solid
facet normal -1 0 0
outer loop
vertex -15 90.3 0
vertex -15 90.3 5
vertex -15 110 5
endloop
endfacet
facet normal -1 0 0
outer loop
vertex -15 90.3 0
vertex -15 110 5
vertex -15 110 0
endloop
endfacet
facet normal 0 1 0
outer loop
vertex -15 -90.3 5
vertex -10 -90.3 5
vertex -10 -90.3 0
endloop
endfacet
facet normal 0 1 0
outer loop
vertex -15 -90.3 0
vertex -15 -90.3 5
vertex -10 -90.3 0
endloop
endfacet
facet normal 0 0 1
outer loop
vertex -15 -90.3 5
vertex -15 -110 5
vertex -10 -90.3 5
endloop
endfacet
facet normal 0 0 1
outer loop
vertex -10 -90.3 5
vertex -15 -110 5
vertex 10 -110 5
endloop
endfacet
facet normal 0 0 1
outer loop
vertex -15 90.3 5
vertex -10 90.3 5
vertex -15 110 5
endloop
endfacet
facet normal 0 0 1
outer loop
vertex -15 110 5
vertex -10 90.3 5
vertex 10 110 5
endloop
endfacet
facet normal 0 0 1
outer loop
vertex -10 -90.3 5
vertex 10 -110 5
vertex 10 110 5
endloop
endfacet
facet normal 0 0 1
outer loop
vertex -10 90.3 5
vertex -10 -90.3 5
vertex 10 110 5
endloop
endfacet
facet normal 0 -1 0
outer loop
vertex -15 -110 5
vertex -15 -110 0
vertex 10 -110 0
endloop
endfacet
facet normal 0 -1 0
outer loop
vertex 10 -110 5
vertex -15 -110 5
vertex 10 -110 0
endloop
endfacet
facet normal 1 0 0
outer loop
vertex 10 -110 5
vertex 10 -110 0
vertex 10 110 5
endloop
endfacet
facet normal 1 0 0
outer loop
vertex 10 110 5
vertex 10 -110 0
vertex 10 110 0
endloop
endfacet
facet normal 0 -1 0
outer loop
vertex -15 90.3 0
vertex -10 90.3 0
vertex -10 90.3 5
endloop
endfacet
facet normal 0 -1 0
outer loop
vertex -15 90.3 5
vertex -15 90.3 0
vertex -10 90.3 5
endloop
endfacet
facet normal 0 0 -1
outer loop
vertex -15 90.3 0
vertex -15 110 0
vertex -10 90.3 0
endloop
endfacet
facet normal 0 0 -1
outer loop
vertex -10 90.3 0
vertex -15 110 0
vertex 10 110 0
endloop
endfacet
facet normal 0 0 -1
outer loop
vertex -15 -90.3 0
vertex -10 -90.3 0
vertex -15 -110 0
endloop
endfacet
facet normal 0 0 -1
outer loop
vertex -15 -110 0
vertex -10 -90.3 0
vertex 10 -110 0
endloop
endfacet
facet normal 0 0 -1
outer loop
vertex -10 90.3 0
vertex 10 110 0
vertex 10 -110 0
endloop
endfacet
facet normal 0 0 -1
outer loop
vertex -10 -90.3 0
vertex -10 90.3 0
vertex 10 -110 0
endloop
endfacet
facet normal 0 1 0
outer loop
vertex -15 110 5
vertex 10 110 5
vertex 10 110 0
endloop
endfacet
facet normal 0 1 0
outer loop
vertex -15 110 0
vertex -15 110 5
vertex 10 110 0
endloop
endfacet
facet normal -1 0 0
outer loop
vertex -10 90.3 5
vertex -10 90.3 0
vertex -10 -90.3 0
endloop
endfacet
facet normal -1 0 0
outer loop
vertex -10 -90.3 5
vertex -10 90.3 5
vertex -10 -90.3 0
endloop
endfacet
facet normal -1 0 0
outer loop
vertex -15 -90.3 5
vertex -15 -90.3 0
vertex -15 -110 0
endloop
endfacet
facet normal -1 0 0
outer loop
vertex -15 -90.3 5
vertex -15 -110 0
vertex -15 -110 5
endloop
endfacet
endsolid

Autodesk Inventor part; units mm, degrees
ref_plane "YZ Plane" through (0, 0, 0) normal (1, 0, 0) x (0, 1, 0)
ref_plane "XZ Plane" through (0, 0, 0) normal (0, 1, 0) x (-1, 0, 0)
ref_plane "XY Plane" through (0, 0, 0) normal (0, 0, 1) x (1, 0, 0)
sketch "Sketch1" plane through (0, 0, 0) normal (0, 0, 1) x (1, 0, 0)
  line L0 (-10, -110) -> (10, -110)
  line L1 (10, -110) -> (10, 110)
  line L2 (10, 110) -> (-10, 110)
  line L3 (-10, 110) -> (-10, -110)
  point P0 (0, 0)
  dimension "width" = 20
  dimension "d1" = 10
  dimension "d2" = 220
  dimension "d3" = 110
extrude "Extrusion1" add sketch "Sketch1" along normal blind 5
sketch "Sketch4" plane through (-10, -110, 0) normal (-1, 0, 0) x (0, 0, 1)
  line L0 (5, 0) -> (5, 220) projected
  line L1 (0, 0) -> (5, 0)
  line L2 (5, 0) -> (5, 19.7)
  line L3 (5, 19.7) -> (0, 19.7)
  line L4 (0, 19.7) -> (0, 0)
  point P0 (0, 110)
  dimension "d29" = 19.7
extrude "Extrusion4" add sketch "Sketch4" along normal blind 5
mirror "Mirror1" about plane through (0, 0, 0) normal (0, 1, 0) of "Extrusion4"
equation "\"d1\" = 0.5 * width"
equation "\"d3\" = 0.5 * d2"
properties part number "EBF_001.1-side-plate_cup-holder"
